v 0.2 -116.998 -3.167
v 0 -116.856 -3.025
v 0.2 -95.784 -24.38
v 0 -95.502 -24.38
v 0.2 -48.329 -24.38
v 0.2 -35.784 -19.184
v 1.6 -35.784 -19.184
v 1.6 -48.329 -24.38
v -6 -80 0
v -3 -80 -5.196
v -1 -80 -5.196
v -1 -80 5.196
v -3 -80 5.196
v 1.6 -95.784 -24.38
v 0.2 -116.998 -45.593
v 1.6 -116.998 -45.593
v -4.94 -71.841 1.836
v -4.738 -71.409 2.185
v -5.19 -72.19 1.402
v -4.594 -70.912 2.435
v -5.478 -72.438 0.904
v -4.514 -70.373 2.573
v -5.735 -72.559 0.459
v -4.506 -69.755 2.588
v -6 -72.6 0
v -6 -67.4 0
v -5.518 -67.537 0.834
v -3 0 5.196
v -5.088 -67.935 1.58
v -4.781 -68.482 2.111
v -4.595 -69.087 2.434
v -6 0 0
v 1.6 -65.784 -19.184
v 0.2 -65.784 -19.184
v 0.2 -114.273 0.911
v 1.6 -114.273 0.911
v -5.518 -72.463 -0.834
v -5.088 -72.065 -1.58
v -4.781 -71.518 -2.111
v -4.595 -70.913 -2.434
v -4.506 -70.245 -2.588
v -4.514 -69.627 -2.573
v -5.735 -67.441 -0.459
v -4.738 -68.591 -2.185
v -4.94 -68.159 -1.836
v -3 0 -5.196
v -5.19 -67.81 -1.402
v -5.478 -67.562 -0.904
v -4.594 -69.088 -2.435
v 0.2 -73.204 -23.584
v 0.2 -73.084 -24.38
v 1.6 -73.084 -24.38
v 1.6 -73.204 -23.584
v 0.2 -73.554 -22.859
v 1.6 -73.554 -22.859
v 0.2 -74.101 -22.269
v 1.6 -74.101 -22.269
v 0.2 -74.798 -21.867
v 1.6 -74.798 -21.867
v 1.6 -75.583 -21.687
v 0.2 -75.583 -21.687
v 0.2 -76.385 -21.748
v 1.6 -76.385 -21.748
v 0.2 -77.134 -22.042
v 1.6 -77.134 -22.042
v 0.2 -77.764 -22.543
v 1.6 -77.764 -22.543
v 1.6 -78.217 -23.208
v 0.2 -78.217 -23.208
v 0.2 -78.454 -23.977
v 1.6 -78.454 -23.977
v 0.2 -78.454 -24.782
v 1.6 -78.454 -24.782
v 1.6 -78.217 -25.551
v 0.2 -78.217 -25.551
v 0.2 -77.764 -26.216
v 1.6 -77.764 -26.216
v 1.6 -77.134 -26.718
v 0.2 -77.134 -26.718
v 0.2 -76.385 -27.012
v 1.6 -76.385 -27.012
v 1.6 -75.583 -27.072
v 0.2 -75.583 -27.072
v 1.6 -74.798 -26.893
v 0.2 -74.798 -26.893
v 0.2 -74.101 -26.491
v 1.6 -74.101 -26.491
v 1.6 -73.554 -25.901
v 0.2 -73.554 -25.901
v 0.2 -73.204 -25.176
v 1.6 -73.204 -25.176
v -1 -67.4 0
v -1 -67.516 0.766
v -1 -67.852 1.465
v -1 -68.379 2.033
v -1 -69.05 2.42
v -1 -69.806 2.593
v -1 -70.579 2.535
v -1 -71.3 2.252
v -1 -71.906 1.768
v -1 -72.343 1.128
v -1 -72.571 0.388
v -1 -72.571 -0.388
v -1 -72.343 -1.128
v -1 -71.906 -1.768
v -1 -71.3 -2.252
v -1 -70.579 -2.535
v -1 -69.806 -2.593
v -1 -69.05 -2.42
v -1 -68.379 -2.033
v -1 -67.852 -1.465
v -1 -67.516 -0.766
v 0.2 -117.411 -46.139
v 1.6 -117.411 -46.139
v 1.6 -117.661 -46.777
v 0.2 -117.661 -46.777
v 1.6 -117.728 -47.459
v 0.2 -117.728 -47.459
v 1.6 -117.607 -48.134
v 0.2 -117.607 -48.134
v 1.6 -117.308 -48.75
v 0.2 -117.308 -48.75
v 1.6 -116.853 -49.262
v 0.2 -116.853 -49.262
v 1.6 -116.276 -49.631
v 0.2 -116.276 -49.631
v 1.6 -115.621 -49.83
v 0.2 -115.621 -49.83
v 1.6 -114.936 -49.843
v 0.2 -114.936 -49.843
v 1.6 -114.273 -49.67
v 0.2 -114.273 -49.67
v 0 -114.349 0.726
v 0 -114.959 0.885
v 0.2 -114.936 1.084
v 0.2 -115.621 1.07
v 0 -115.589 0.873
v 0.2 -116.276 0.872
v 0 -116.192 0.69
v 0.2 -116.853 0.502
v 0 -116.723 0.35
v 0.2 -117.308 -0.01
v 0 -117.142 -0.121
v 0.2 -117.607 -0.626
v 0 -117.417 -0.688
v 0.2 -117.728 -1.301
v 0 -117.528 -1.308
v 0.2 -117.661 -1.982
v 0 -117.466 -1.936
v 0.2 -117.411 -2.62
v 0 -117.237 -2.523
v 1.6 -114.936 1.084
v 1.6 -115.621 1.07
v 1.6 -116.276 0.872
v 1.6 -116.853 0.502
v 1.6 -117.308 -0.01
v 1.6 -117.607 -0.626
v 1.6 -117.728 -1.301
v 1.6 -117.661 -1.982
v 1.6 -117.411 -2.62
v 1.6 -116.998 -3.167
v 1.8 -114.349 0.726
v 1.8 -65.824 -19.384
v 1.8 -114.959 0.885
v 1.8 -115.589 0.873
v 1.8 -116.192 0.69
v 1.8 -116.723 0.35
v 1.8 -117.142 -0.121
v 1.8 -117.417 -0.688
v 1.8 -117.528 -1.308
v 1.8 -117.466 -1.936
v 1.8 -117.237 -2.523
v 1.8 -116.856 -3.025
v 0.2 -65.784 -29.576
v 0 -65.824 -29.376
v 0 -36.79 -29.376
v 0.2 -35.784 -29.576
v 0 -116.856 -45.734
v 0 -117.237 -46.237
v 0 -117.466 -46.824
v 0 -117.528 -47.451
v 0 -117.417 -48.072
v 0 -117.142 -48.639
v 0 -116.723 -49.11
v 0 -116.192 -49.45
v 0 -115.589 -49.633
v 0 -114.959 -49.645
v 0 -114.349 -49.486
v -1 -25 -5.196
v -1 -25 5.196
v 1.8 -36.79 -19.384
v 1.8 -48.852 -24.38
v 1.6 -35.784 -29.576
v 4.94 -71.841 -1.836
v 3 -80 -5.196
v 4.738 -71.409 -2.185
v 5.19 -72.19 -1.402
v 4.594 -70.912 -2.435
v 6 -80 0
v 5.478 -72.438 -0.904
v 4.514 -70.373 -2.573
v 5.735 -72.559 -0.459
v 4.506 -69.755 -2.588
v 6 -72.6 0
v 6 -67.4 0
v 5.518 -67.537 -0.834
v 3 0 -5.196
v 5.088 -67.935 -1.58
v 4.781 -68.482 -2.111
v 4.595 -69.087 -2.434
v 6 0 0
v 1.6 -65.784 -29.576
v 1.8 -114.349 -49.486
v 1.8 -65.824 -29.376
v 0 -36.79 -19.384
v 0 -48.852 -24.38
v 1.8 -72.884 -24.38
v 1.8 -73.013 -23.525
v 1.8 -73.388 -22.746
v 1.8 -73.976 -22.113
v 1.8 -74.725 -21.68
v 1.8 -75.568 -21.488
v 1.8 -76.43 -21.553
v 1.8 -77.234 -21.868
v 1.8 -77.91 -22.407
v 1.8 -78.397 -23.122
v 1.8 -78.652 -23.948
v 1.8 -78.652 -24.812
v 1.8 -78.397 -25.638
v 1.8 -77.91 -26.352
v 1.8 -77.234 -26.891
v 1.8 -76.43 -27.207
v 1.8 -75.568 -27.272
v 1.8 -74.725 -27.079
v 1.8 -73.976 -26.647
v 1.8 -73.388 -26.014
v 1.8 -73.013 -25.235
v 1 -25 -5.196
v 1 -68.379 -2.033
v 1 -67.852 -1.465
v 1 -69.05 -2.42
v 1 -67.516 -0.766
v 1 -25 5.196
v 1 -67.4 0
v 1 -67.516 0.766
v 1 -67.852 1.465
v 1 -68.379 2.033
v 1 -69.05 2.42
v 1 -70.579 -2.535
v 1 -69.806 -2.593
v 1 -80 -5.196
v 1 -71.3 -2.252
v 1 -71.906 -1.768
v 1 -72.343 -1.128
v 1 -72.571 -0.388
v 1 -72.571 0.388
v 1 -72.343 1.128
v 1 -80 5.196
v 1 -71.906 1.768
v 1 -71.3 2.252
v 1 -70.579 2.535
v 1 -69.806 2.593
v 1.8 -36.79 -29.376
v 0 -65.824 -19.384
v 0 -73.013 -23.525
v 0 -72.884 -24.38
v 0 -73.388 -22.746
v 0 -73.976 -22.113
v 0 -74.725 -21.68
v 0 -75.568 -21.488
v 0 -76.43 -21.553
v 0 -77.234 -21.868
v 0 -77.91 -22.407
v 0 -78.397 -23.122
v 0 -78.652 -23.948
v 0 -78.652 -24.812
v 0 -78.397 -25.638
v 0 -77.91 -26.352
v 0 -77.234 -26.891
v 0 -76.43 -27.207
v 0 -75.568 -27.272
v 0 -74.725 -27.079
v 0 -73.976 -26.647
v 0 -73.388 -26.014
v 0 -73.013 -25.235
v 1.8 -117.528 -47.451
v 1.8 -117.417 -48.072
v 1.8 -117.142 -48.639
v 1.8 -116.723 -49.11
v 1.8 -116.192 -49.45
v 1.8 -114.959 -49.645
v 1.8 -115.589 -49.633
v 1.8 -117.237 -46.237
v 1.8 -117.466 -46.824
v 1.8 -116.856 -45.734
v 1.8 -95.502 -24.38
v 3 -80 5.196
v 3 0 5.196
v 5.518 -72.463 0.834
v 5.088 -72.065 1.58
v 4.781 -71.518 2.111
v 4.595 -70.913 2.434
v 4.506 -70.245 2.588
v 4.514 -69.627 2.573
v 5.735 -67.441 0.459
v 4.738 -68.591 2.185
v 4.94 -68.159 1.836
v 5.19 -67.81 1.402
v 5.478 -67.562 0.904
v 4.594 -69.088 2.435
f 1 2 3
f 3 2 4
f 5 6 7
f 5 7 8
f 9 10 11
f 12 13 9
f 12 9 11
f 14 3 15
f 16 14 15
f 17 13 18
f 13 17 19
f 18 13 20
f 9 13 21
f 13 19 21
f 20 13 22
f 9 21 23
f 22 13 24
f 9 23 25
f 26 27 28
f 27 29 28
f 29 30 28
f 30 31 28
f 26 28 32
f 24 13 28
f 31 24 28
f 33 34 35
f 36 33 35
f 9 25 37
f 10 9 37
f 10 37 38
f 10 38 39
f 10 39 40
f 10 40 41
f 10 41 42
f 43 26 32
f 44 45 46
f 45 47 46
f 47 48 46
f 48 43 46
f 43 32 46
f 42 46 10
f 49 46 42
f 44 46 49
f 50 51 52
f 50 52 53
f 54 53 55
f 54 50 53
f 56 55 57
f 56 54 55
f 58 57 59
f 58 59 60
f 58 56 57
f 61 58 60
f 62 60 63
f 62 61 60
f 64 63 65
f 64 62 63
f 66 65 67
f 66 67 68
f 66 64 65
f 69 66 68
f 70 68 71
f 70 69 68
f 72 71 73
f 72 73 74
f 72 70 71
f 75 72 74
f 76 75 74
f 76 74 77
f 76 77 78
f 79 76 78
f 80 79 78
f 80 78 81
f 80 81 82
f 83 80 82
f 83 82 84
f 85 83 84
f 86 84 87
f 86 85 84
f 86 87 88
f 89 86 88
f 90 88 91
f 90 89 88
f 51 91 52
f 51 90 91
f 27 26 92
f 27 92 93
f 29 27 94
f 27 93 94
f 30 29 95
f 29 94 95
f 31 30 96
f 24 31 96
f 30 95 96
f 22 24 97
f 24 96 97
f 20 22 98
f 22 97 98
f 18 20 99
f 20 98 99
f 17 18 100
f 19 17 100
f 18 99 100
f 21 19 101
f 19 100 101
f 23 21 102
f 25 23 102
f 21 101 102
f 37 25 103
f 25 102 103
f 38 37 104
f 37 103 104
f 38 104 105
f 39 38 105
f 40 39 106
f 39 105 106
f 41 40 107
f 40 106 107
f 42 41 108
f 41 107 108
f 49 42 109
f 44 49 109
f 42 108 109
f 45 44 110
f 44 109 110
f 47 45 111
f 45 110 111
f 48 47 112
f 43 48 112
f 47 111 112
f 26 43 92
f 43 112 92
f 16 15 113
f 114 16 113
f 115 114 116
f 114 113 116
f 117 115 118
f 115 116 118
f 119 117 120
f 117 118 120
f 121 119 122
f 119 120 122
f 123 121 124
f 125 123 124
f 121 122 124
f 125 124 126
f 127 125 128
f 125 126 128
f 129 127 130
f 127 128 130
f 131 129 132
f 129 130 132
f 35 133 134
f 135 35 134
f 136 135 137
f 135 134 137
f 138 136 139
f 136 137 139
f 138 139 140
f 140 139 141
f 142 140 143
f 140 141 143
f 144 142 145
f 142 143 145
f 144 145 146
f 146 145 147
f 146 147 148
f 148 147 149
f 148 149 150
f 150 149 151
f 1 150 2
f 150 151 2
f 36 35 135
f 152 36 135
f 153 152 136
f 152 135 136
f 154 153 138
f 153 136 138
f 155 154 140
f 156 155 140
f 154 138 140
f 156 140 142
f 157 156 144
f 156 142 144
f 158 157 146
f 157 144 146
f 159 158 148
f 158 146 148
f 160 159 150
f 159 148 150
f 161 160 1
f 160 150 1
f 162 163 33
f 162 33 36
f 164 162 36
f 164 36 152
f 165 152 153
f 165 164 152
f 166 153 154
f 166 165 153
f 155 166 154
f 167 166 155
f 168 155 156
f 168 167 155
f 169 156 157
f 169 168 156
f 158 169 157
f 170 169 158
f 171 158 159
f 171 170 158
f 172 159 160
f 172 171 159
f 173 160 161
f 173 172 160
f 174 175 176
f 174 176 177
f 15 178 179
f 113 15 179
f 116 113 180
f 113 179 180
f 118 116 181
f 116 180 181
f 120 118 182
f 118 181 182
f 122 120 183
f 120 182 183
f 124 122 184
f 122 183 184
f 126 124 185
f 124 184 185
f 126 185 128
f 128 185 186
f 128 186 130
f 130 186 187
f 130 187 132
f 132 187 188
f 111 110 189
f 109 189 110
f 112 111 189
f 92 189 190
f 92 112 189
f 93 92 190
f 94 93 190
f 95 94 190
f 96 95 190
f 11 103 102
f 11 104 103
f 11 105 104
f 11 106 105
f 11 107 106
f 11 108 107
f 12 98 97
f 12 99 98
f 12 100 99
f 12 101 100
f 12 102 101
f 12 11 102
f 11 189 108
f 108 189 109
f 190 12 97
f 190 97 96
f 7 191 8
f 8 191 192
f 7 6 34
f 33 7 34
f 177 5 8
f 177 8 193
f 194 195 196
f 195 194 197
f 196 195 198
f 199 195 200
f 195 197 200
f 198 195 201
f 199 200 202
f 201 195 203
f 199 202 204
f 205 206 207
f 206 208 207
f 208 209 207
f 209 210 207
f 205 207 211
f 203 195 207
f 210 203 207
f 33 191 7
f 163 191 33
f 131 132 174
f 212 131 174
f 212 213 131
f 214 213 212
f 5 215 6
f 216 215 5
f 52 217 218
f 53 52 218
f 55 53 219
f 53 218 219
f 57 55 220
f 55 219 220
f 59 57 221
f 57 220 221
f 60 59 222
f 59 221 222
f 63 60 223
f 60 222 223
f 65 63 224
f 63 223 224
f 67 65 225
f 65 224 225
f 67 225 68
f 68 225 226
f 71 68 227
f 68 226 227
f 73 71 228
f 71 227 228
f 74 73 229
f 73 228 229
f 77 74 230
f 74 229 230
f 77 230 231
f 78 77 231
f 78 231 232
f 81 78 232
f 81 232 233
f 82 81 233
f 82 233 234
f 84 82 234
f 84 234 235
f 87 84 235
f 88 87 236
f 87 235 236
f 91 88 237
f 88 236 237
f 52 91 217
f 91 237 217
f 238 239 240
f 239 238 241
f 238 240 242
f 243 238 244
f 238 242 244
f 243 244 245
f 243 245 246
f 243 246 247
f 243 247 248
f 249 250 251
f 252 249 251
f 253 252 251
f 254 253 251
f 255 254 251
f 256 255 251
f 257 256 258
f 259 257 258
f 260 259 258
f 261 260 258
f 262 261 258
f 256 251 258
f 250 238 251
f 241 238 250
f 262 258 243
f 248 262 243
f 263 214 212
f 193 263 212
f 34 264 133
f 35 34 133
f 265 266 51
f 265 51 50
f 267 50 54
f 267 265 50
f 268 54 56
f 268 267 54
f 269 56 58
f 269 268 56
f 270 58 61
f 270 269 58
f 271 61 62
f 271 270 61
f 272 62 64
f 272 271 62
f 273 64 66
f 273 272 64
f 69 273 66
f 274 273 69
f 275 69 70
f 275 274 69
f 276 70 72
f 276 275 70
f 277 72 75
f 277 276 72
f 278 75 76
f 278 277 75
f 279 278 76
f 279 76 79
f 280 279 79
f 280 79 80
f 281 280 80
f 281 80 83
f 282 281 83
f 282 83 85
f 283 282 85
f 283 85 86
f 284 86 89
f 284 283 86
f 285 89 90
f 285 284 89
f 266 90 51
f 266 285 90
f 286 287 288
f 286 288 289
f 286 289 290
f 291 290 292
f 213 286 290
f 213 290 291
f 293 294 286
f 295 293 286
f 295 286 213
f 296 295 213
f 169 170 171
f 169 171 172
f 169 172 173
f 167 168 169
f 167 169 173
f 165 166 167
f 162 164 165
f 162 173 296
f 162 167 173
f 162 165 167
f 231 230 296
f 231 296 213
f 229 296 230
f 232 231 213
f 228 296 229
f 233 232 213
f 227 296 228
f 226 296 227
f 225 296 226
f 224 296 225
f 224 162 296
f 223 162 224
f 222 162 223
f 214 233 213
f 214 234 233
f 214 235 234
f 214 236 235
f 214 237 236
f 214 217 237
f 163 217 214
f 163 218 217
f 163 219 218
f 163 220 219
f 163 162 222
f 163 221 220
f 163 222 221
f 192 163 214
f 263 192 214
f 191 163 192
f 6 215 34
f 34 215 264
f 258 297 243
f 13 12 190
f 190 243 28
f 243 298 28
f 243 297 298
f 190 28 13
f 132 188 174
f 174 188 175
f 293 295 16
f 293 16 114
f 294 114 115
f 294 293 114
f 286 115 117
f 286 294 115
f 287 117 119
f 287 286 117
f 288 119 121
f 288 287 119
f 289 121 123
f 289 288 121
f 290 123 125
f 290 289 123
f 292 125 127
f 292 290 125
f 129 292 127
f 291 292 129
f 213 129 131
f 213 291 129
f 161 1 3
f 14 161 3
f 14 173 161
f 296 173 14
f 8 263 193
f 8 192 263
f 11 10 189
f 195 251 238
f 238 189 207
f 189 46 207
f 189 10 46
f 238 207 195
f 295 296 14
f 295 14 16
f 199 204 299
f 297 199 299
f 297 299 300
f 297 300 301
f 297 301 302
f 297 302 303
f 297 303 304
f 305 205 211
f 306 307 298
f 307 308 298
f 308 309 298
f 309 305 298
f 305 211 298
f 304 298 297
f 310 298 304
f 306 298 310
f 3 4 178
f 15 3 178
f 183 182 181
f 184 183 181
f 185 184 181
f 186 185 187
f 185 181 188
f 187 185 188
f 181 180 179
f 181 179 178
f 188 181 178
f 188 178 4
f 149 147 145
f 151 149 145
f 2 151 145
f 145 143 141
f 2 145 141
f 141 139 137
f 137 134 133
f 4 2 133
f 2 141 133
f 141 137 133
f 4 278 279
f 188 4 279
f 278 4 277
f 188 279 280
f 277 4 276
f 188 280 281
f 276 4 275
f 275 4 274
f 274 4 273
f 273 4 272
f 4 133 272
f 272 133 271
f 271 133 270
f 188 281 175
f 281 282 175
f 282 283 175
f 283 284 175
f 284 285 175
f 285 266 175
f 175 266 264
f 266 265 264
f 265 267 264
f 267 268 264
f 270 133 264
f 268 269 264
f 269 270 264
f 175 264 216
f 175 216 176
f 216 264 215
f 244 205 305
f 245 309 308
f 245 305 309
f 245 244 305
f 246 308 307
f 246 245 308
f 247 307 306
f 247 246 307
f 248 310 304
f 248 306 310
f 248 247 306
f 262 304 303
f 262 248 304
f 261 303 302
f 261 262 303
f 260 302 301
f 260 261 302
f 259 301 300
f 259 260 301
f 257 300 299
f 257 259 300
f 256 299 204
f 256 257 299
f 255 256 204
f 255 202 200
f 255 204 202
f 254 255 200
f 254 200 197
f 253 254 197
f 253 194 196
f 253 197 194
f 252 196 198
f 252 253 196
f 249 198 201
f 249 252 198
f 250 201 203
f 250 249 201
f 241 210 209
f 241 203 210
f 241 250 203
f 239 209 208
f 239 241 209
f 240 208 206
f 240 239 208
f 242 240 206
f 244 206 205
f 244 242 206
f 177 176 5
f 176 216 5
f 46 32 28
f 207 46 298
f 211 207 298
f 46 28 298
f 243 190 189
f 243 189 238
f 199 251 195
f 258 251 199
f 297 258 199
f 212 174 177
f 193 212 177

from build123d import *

# Parameters (mm, degrees)
PAD_DEPTH            = 80
SKETCH001_W          = 2
SKETCH001_H          = 10.392304
POCKET_DEPTH         = 55
SKETCH002_R          = 2.6
POCKET001_DEPTH      = 6.001
POCKET001_DEPTH_BACK = -6.001
SKETCH003_R          = 2.7
PAD001_DEPTH         = 1.8
CHAMFER_SIZE         = 0.2


with BuildPart() as shaft:
    # Sketch → Pad (new body)
    with BuildSketch(Plane.XZ):
        Polygon((-3, 5.196152), (-6, 0), (-3, -5.196152), (3, -5.196152), (6, 0), (3, 5.196152), align=None)
    extrude(amount=PAD_DEPTH)

    # Sketch001 (on Face8 of Pad) → Pocket (cut)
    with BuildSketch(Plane.XZ.offset(80)):
        Rectangle(SKETCH001_W, SKETCH001_H)
    extrude(amount=-POCKET_DEPTH, mode=Mode.SUBTRACT)

    # Sketch002 → Pocket001 (cut, two sides)
    with BuildSketch(Plane.YZ) as pocket001_sk:
        with Locations((-70, 0)):
            Circle(SKETCH002_R)
    extrude(amount=-POCKET001_DEPTH, mode=Mode.SUBTRACT)
    extrude(pocket001_sk.sketch, amount=-POCKET001_DEPTH_BACK, mode=Mode.SUBTRACT)


with BuildPart() as finder:
    # Sketch003 → Pad001 (new body)
    with BuildSketch(Plane.YZ):
        with BuildLine():
            Line((-116.997551, -3.166671), (-95.784347, -24.379874))
            Line((-95.784347, -24.379874), (-116.997551, -45.593078))
            ThreePointArc((-116.997551, -45.593078), (-117.308338, -48.74995), (-114.272676, -49.670378))
            Line((-114.272676, -49.670378), (-65.784347, -29.576027))
            Line((-65.784347, -29.576027), (-35.784347, -29.576027))
            Line((-48.328969, -24.379874), (-35.784347, -29.576027))
            Line((-35.784347, -19.183722), (-48.328969, -24.379874))
            Line((-35.784347, -19.183722), (-65.784347, -19.183722))
            Line((-65.784347, -19.183722), (-114.272676, 0.910629))
            ThreePointArc((-114.272676, 0.910629), (-117.308338, -0.009799), (-116.997551, -3.166671))
        make_face()
        with Locations((-75.784347, -24.379874)):
            Circle(SKETCH003_R, mode=Mode.SUBTRACT)
    extrude(amount=PAD001_DEPTH)

    # Chamfer
    chamfer_edges = [finder.edges().sort_by_distance(p)[0] for p in [
        (1.8, -50.784347, -19.183722),
        (1.8, -90.028512, -9.136546),
        (1.8, -117.308338, -0.009799),
        (1.8, -106.390949, -13.773273),
        (1.8, -106.390949, -34.986476),
        (1.8, -117.308338, -48.74995),
        (1.8, -90.028512, -39.623203),
        (1.8, -50.784347, -29.576027),
        (1.8, -42.056658, -26.977951),
        (1.8, -42.056658, -21.781798),
        (1.8, -78.484347, -24.379874),
        (0, -50.784347, -19.183722),
        (0, -90.028512, -9.136546),
        (0, -117.308338, -0.009799),
        (0, -106.390949, -13.773273),
        (0, -106.390949, -34.986476),
        (0, -117.308338, -48.74995),
        (0, -90.028512, -39.623203),
        (0, -50.784347, -29.576027),
        (0, -42.056658, -26.977951),
        (0, -42.056658, -21.781798),
        (0, -78.484347, -24.379874),
    ]]
    chamfer(chamfer_edges, length=CHAMFER_SIZE)


solid = Compound([shaft.part, finder.part])
